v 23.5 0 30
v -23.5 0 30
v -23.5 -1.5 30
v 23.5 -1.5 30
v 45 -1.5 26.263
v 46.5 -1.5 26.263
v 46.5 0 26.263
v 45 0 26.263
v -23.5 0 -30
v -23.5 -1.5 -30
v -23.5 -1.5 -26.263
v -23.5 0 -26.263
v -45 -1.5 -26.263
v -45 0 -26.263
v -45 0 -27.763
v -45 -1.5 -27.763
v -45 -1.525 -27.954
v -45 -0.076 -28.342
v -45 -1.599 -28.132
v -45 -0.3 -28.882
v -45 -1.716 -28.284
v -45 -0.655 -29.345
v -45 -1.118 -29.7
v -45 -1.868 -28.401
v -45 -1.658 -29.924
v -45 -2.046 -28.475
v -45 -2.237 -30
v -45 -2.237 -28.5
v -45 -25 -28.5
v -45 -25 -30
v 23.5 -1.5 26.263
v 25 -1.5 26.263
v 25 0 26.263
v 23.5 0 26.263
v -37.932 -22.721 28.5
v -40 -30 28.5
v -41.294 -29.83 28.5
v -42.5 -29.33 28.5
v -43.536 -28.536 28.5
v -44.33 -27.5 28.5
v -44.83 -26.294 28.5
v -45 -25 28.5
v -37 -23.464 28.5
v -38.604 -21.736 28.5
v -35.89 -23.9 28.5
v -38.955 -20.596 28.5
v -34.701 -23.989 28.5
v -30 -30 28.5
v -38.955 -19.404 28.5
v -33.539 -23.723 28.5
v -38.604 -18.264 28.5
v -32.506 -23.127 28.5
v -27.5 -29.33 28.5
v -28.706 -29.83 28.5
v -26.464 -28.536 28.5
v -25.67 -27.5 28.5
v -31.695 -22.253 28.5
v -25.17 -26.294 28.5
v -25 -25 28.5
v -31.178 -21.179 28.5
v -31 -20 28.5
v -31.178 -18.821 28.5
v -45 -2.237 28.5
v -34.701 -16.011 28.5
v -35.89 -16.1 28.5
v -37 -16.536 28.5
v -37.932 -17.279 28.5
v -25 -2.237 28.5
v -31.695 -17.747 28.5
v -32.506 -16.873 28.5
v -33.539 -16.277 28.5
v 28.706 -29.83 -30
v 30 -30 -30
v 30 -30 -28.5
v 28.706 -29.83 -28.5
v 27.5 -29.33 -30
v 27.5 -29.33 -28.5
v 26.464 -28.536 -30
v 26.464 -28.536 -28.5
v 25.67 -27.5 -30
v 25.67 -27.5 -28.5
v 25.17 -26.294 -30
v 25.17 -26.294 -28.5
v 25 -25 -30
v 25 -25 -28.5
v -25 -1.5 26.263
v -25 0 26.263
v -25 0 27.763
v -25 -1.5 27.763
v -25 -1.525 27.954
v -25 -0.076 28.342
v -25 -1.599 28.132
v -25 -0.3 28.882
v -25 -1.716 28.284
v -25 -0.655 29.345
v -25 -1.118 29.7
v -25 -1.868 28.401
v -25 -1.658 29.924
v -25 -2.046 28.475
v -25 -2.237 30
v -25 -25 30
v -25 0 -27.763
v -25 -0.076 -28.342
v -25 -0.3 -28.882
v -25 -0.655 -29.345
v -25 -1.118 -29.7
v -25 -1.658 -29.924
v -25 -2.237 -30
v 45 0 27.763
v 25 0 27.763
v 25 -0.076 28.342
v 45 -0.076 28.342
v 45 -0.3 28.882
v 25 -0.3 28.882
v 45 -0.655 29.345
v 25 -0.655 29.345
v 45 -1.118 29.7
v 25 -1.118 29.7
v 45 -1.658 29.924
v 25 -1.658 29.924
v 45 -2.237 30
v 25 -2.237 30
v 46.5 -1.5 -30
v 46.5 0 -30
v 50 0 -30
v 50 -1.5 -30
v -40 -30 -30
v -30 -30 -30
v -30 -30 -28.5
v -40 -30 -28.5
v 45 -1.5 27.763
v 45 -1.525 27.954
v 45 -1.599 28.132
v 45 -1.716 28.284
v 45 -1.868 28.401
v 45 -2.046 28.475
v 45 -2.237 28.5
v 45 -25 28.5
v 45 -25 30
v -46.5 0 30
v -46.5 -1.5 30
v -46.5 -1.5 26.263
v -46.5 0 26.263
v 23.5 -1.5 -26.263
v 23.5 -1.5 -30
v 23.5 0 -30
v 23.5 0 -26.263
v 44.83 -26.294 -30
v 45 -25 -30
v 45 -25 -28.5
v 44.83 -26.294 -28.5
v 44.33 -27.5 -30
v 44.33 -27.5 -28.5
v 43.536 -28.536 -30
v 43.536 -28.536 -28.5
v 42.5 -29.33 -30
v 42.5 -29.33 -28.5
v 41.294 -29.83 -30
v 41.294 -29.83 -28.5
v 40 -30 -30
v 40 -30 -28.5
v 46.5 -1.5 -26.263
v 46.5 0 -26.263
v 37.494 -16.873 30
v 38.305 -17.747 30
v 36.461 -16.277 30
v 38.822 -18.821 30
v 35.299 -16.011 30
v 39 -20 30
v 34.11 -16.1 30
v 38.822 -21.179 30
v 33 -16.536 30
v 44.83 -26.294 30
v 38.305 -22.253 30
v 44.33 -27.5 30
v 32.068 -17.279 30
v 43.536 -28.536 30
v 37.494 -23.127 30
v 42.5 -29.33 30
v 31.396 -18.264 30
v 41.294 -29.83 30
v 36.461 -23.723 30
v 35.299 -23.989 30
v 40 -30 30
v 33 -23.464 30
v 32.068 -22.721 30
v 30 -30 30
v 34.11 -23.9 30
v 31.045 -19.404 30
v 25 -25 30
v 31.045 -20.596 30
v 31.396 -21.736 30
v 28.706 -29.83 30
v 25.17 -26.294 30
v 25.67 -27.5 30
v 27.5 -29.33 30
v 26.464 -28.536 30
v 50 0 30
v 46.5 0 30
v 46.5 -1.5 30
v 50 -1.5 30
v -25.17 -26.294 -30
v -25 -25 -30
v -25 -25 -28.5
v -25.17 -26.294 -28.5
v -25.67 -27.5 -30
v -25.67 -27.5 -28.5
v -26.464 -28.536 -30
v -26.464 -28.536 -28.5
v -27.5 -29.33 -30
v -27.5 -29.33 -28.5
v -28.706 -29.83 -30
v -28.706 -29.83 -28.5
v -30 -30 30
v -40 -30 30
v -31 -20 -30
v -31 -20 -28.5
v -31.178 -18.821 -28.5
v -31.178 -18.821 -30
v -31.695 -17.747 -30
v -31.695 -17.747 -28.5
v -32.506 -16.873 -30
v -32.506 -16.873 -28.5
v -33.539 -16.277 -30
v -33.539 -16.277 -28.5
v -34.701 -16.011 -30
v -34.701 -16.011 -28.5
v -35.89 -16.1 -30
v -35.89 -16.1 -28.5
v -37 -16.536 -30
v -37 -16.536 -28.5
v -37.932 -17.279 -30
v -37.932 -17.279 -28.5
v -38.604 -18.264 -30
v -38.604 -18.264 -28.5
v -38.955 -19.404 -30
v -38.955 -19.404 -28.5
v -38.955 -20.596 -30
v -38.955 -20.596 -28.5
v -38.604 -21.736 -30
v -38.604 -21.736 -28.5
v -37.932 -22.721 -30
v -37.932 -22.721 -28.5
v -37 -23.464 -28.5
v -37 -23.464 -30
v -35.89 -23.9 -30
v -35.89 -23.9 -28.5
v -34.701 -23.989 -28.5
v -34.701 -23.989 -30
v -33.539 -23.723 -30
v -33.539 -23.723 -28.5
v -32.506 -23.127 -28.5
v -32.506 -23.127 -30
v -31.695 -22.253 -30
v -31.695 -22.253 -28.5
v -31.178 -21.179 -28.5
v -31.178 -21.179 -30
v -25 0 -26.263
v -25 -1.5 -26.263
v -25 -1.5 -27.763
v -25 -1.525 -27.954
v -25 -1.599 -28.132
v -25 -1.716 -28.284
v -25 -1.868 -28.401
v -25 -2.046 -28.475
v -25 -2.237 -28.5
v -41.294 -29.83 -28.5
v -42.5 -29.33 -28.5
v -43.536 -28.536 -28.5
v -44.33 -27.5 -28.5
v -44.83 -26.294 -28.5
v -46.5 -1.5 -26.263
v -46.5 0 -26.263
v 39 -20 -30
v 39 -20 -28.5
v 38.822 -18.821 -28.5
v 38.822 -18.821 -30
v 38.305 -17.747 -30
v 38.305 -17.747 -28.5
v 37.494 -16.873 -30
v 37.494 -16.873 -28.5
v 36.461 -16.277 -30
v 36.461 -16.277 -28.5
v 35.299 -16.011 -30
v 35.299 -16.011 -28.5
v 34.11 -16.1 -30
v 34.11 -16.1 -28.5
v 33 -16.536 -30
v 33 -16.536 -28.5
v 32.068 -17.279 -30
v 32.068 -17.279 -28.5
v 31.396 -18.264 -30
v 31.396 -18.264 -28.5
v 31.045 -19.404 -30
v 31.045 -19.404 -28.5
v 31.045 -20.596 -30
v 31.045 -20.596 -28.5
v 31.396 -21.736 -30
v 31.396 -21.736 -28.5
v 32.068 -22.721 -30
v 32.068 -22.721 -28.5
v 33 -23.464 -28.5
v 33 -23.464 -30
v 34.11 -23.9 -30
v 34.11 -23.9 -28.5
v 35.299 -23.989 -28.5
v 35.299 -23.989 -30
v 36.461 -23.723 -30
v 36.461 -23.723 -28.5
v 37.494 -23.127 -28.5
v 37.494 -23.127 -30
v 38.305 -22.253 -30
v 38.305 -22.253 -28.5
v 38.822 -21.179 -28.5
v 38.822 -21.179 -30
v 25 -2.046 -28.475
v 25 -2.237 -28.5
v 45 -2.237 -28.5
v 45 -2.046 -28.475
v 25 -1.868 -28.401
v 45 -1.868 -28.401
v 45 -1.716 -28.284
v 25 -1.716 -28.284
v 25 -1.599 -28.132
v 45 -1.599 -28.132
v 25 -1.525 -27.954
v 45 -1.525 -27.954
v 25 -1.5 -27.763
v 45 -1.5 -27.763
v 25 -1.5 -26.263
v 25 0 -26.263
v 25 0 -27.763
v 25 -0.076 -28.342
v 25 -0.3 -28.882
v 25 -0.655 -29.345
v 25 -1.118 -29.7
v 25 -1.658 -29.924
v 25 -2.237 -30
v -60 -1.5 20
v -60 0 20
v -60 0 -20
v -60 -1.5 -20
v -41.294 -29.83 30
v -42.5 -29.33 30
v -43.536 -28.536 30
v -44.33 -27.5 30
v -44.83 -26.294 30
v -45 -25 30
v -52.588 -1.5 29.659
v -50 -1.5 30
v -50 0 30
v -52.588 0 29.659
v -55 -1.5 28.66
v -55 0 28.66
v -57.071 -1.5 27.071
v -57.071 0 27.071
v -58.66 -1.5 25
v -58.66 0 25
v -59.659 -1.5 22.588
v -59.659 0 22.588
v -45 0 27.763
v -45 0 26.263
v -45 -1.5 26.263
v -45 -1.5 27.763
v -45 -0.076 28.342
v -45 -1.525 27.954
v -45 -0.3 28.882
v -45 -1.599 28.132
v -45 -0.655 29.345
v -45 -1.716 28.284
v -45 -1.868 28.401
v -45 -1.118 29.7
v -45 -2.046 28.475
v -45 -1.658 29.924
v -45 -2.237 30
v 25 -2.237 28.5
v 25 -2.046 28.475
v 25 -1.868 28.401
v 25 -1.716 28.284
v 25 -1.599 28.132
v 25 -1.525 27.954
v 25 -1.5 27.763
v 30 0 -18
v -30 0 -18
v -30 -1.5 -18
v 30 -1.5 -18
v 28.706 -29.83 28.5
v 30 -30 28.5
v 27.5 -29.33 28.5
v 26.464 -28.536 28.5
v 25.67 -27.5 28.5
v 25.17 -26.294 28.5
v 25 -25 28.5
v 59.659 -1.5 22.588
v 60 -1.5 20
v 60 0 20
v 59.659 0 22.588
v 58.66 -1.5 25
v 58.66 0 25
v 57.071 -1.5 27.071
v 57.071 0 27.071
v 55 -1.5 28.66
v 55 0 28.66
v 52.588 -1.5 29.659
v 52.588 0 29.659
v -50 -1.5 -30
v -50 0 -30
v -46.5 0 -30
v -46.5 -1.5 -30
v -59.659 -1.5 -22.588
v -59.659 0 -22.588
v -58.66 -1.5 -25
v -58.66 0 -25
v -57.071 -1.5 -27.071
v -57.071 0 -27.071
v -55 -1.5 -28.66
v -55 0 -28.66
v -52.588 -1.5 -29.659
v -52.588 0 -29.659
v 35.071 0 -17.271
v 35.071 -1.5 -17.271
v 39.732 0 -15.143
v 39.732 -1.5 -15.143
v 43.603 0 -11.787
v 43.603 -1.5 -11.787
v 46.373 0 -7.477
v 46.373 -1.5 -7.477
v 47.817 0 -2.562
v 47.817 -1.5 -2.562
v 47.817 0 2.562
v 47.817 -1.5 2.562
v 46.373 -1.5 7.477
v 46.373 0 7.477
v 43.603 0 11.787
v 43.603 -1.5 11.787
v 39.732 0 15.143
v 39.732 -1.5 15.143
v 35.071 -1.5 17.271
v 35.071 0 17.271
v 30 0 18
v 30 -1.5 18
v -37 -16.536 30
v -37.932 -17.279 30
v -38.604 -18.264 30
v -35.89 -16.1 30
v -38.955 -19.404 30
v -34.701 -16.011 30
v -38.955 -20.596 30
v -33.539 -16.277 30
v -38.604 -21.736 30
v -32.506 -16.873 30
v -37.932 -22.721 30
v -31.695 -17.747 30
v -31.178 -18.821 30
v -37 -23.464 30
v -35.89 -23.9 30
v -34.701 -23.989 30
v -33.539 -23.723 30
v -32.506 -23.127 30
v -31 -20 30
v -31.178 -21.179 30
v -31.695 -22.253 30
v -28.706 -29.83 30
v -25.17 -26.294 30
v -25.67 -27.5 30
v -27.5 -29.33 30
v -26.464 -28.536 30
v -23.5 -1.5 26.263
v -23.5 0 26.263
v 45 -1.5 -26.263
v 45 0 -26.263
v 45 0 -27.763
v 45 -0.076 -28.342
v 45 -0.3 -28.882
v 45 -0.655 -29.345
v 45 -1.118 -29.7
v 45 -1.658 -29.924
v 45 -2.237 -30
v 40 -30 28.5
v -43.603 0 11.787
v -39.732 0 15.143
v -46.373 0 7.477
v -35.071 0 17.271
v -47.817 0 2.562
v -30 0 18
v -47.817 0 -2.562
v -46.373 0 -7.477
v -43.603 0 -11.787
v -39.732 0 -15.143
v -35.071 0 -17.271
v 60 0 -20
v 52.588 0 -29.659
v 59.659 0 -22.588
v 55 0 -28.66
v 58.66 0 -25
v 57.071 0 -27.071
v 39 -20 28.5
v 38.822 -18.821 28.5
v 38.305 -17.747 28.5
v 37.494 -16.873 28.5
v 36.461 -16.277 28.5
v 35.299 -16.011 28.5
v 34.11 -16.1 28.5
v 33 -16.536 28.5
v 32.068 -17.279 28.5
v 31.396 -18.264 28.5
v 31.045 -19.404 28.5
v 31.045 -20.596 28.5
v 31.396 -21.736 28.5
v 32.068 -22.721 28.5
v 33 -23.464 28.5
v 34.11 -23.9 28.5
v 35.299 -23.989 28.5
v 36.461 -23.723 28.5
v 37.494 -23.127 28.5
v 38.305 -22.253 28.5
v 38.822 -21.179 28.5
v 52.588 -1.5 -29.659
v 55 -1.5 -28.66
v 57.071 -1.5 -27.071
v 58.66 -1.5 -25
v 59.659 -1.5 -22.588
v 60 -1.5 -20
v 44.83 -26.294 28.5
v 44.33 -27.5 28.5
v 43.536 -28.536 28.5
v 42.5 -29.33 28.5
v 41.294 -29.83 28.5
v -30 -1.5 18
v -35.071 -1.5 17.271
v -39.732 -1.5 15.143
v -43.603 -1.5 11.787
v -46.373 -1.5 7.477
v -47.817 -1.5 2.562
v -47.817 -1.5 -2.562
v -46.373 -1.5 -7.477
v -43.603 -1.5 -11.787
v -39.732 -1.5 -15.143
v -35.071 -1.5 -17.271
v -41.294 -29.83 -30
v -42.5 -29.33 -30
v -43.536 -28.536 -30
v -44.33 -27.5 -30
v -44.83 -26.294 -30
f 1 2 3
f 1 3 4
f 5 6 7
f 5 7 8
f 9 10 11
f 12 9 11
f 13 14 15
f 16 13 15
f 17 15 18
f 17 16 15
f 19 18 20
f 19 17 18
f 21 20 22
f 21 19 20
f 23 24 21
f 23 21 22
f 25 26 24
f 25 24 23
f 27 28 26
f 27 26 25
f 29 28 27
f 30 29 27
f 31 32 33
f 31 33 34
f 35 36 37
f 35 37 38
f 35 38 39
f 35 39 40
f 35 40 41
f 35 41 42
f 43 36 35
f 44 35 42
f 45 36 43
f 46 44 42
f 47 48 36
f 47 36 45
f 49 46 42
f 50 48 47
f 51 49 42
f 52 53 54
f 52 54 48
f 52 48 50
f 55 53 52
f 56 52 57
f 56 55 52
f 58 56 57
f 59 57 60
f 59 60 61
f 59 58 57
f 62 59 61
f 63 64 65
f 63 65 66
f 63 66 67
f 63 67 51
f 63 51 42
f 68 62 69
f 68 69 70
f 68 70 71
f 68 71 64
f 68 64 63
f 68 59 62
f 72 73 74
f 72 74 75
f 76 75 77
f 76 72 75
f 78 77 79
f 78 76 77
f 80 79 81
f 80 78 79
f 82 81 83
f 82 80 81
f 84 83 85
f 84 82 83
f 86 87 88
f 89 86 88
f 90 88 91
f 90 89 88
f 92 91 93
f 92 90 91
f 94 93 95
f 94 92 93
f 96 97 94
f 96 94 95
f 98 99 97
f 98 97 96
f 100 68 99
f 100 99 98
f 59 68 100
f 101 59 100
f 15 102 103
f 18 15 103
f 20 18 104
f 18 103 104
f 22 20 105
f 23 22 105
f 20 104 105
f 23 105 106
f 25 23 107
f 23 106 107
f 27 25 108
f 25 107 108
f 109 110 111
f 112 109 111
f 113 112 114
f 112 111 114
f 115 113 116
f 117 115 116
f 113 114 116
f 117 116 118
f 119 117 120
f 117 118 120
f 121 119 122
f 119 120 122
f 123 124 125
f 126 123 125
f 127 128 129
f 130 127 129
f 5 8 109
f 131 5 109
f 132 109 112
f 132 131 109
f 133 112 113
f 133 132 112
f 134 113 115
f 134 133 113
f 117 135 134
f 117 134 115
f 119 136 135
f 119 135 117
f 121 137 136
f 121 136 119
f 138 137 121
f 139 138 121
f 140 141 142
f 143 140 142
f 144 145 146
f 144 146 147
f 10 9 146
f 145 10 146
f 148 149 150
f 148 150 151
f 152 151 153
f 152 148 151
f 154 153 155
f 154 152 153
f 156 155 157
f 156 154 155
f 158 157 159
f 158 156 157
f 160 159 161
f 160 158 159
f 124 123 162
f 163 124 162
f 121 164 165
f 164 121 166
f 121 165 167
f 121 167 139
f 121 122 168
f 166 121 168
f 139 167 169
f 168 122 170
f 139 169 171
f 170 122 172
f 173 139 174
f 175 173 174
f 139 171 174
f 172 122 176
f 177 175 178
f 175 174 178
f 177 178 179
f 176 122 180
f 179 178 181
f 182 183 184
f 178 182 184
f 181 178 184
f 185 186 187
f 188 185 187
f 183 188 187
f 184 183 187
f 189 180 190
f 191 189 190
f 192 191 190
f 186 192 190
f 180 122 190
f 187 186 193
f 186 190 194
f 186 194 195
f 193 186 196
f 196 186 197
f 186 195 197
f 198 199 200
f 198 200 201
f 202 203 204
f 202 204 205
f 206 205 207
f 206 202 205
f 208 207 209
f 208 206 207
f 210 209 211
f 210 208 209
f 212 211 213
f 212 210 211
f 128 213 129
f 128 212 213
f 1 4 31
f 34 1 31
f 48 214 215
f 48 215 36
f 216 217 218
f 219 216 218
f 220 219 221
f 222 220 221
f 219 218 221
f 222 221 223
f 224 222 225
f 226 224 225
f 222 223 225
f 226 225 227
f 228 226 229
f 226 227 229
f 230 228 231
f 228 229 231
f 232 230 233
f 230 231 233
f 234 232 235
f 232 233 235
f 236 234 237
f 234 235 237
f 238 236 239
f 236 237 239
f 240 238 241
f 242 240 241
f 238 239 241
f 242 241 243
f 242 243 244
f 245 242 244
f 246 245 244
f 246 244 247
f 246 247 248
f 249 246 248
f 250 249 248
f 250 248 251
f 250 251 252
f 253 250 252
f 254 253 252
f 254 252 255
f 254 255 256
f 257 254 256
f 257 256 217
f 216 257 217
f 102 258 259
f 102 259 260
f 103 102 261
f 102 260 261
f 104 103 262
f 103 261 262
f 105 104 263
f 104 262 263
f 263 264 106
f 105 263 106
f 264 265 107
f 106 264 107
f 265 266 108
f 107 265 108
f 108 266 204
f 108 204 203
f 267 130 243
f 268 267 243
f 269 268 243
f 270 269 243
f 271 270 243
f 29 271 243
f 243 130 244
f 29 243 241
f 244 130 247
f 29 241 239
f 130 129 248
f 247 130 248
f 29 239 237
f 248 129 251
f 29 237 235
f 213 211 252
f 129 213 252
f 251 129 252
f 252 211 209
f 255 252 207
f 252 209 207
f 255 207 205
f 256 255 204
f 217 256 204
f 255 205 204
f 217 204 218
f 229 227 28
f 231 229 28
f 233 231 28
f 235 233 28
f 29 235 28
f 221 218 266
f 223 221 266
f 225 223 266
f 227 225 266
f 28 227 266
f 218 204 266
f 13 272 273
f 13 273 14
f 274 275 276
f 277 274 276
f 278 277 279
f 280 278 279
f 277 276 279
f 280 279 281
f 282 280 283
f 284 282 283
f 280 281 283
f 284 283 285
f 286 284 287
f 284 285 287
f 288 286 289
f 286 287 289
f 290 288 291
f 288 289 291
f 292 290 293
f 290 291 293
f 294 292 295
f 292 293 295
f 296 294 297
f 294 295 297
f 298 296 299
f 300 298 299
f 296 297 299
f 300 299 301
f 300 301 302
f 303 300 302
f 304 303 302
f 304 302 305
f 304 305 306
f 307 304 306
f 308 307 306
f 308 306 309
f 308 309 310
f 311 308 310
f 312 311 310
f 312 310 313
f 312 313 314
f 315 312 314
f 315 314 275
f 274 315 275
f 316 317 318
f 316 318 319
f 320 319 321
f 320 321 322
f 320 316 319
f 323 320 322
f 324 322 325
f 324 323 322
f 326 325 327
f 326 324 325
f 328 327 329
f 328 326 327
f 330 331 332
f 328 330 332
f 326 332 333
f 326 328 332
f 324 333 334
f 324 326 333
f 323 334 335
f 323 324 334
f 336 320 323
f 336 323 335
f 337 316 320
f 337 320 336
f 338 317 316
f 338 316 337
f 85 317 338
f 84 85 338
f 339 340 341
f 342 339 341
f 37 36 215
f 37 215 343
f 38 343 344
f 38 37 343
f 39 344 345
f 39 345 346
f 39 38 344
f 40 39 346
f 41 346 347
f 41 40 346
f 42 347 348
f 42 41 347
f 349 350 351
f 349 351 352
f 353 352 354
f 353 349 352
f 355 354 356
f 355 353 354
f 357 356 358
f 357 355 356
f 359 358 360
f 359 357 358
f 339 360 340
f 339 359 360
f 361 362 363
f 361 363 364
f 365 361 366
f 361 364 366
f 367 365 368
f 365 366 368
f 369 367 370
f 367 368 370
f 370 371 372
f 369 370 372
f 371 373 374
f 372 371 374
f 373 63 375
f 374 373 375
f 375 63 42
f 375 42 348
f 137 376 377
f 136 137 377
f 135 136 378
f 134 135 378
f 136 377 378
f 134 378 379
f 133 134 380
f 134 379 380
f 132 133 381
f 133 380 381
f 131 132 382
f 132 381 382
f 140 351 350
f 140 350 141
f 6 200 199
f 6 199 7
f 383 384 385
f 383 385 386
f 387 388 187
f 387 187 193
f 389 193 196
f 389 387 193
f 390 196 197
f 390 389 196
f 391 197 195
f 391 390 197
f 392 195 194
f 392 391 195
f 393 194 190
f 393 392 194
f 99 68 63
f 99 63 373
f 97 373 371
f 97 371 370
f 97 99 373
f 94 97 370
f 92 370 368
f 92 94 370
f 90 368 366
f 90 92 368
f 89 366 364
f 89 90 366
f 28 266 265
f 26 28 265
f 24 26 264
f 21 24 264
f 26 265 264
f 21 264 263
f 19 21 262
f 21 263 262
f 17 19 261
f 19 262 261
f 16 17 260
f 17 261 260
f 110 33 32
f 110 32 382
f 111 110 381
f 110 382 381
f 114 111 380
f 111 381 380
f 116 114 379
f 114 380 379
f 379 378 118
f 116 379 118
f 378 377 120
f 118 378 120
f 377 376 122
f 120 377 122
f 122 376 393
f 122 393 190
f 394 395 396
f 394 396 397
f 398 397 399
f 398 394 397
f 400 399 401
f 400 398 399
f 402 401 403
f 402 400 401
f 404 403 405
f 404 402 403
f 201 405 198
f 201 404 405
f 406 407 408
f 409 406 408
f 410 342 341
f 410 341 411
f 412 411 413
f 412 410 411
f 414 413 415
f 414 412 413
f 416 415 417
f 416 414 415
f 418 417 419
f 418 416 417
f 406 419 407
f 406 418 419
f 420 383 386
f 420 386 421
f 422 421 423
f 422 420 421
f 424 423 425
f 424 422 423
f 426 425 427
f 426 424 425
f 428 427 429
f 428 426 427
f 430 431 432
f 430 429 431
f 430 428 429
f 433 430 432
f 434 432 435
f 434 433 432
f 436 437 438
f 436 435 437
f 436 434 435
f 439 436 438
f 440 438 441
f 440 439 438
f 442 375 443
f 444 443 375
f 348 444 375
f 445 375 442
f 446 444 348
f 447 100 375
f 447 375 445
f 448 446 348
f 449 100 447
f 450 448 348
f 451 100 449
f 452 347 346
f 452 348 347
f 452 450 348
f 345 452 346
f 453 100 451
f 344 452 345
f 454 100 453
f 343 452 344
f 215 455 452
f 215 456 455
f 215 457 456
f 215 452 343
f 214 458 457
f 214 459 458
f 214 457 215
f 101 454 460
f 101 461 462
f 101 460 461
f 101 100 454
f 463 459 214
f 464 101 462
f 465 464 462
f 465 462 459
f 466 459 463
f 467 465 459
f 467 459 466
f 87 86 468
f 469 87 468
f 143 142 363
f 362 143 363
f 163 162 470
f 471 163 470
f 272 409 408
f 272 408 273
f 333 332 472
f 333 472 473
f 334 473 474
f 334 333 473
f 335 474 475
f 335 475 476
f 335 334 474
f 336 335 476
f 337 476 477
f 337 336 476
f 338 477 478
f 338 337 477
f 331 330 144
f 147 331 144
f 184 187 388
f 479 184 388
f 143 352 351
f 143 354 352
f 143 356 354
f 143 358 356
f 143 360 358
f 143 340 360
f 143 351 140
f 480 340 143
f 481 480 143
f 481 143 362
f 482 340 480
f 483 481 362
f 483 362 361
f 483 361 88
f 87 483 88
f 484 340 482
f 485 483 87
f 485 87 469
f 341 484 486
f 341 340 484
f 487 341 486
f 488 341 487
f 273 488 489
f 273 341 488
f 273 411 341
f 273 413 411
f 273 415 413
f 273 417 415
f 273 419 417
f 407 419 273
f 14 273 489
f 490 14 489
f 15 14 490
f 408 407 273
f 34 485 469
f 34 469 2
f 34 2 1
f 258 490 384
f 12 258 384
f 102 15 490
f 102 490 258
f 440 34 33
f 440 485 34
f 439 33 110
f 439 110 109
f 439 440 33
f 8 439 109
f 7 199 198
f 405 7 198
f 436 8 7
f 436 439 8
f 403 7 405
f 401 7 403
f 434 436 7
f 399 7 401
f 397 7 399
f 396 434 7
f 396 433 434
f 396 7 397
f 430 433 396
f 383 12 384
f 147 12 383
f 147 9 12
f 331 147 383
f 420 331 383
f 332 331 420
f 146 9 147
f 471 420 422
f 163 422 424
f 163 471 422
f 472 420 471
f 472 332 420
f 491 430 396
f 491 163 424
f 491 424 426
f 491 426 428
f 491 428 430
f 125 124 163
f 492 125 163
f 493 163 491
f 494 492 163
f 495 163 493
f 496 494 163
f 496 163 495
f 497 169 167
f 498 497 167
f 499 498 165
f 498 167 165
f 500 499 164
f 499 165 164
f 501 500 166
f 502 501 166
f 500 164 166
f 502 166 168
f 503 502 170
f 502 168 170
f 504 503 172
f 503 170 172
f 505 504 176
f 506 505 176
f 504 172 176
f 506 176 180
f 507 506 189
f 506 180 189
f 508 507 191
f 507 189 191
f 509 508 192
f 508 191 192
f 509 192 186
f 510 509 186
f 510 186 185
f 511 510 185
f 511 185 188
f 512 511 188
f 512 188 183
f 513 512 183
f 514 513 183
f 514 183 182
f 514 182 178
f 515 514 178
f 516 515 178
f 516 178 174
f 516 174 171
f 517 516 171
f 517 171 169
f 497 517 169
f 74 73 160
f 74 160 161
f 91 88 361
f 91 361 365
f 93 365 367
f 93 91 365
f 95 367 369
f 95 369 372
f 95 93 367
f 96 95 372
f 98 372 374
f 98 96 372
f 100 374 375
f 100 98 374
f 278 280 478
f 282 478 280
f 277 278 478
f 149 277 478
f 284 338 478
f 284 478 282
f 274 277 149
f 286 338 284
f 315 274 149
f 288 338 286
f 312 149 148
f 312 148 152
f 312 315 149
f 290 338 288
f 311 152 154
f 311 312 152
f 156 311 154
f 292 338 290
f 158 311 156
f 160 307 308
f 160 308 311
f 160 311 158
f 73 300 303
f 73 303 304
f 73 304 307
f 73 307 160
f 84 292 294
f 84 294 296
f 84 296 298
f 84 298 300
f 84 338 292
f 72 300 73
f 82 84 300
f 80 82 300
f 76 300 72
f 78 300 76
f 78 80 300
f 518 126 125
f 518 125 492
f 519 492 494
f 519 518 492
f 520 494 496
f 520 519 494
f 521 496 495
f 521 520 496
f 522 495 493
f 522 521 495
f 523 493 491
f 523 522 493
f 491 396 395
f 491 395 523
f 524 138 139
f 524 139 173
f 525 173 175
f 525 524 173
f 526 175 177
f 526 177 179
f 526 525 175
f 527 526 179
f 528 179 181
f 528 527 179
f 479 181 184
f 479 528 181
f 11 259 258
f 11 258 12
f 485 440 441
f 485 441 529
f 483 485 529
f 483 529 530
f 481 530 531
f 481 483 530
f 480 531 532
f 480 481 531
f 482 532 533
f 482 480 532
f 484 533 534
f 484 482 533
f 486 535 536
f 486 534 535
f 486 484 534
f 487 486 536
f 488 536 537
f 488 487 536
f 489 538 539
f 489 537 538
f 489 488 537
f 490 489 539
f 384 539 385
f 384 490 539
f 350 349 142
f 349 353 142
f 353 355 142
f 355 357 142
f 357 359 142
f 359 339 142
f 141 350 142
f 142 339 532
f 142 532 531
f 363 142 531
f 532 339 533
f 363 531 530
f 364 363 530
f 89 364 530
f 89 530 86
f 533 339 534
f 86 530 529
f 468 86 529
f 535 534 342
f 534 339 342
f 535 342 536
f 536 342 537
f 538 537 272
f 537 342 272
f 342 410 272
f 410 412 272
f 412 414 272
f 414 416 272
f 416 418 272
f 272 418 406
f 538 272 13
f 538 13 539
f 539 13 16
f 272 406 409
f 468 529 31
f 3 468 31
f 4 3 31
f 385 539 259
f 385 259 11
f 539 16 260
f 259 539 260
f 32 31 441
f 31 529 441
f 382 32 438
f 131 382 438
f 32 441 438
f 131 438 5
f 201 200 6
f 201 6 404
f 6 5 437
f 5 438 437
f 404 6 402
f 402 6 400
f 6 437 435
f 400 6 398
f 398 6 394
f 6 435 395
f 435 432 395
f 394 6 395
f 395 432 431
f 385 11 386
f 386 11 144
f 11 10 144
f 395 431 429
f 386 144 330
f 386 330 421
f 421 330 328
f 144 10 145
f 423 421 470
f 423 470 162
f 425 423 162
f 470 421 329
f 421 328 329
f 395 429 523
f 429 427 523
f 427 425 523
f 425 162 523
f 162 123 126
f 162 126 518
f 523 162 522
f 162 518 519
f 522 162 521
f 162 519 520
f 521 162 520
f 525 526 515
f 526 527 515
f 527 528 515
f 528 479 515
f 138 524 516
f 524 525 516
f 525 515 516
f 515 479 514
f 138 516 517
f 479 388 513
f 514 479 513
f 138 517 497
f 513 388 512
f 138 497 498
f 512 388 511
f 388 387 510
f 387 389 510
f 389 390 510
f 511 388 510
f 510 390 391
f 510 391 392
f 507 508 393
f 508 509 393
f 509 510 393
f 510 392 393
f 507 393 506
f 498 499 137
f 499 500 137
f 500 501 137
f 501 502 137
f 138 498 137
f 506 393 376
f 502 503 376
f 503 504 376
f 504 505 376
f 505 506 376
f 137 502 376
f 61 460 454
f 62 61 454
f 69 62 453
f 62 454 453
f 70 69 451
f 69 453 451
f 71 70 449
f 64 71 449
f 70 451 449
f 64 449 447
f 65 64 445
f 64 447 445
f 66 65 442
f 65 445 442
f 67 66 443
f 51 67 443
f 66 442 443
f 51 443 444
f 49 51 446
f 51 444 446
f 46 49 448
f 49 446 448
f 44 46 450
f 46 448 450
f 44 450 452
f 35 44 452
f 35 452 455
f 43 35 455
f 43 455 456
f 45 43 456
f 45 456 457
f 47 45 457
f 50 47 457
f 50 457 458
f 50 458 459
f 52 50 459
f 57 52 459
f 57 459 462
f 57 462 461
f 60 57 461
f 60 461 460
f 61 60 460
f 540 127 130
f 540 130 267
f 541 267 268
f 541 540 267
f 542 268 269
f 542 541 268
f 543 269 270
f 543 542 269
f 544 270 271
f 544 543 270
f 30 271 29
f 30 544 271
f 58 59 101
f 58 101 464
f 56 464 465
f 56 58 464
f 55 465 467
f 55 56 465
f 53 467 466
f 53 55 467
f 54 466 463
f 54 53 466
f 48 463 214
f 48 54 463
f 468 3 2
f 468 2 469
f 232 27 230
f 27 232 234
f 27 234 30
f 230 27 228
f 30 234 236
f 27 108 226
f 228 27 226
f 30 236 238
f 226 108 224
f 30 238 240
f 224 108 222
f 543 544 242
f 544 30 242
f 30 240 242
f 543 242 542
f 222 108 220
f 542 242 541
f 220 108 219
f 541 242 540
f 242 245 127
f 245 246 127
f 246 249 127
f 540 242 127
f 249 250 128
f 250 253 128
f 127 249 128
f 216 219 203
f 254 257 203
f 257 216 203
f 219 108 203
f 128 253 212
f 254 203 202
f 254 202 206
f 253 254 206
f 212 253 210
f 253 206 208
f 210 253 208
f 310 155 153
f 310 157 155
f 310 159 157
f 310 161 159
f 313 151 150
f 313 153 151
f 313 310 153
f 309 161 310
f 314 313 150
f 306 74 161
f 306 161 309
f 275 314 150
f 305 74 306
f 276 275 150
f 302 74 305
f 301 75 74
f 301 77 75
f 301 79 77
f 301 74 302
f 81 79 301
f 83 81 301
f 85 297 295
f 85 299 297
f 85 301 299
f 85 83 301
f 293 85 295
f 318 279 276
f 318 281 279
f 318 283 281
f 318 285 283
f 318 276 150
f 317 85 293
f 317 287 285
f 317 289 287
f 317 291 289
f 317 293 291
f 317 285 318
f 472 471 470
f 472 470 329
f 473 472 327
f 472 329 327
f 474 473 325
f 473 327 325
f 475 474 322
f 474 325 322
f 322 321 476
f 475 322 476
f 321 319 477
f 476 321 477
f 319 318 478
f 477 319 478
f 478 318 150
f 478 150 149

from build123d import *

# Parameters (mm, degrees)
SKETCH1_W                     = 120
SKETCH1_H                     = 60
BASE_FLANGE1_DEPTH            = 1.5
BREAK_CORNER1_START           = -1.5
BREAK_CORNER1_DEPTH           = 1.5
CUT_EXTRUDE1_DEPTH            = 10
EDGE_FLANGE3_STRIP_W          = 7.4732
EDGE_FLANGE3_STRIP_H          = 1.5
EDGE_FLANGE3_STRIP_CUT_DEPTH  = 20
EDGE_FLANGE3_RELIEF_W         = 8.9732
EDGE_FLANGE3_RELIEF_H         = 1.5
EDGE_FLANGE3_RELIEF_CUT_DEPTH = 1.5
EDGE_FLANGE3_DEPTH            = 20
MIRROR2_COPY_1_SKETCH_W       = 7.4732
MIRROR2_COPY_1_SKETCH_H       = 1.5
MIRROR2_COPY_1_DEPTH          = 20
MIRROR2_COPY_2_SKETCH_W       = 8.9732
MIRROR2_COPY_2_SKETCH_H       = 1.5
MIRROR2_COPY_2_DEPTH          = 1.5
MIRROR2_COPY_3_DEPTH          = 20
SKETCH14_R                    = 4
CUT_EXTRUDE2_DEPTH            = 91
BREAK_CORNER2_START           = -30
BREAK_CORNER2_DEPTH           = 60


# Read off the part's stored shape, not the designer's step: Break-Corner1, Break-Corner2
# Sheet-metal steps are written as plain solids
with BuildPart() as part:
    # Sketch1 → Base-Flange1 (new body)
    with BuildSketch(Plane(origin=(0, 0, 0), x_dir=(1, 0, 0), z_dir=(0, 1, 0))):
        Rectangle(SKETCH1_W, SKETCH1_H)
    extrude(amount=-BASE_FLANGE1_DEPTH)

    # Break-Corner1 outline → Break-Corner1 (cut)
    with BuildSketch(Plane(origin=(0, 0, 0), x_dir=(1, 0, 0), z_dir=(0, 1, 0)).offset(BREAK_CORNER1_START)):
        with BuildLine():
            ThreePointArc((50, 30), (57.071067812, 27.071067812), (60, 20))
            Line((60, 20), (60, 30))
            Line((60, 30), (50, 30))
        make_face()
        with BuildLine():
            Line((60, -30), (60, -20))
            ThreePointArc((60, -20), (57.071067812, -27.071067812), (50, -30))
            Line((50, -30), (60, -30))
        make_face()
        with BuildLine():
            ThreePointArc((-60, 20), (-57.071067812, 27.071067812), (-50, 30))
            Line((-50, 30), (-60, 30))
            Line((-60, 30), (-60, 20))
        make_face()
        with BuildLine():
            Line((-60, -30), (-50, -30))
            ThreePointArc((-50, -30), (-57.071067812, -27.071067812), (-60, -20))
            Line((-60, -20), (-60, -30))
        make_face()
    extrude(amount=BREAK_CORNER1_DEPTH, mode=Mode.SUBTRACT)

    # Sketch6 → Cut-Extrude1 (cut)
    with BuildSketch(Plane(origin=(0, 0, 0), x_dir=(1, 0, 0), z_dir=(0, 1, 0))):
        with BuildLine():
            Line((-30, 18), (30, 18))
            ThreePointArc((30, 18), (48, 0), (30, -18))
            Line((30, -18), (-30, -18))
            ThreePointArc((-30, -18), (-48, 0), (-30, 18))
        make_face()
    extrude(amount=-CUT_EXTRUDE1_DEPTH, mode=Mode.SUBTRACT)

    # Edge-Flange3 strip (across the edge) → Edge-Flange3 strip cut (cut)
    with BuildSketch(Plane(origin=(-25, -1.5, 30), x_dir=(0, 0, -1), z_dir=(-1, 0, 0))):
        with Locations((-1.5, -0.75)):
            Rectangle(EDGE_FLANGE3_STRIP_W, EDGE_FLANGE3_STRIP_H)
    edge_flange3_strip_cut = extrude(amount=EDGE_FLANGE3_STRIP_CUT_DEPTH, mode=Mode.SUBTRACT)

    # Edge-Flange3 relief (on the sheet) → Edge-Flange3 relief cut (cut)
    with BuildSketch(Plane(origin=(-25, -1.5, 27.7634), x_dir=(0, 0, -1), z_dir=(0, -1, 0))):
        with Locations((-2.9866, 0.75)):
            Rectangle(EDGE_FLANGE3_RELIEF_W, EDGE_FLANGE3_RELIEF_H)
        with Locations((-2.9866, -20.75)):
            Rectangle(EDGE_FLANGE3_RELIEF_W, EDGE_FLANGE3_RELIEF_H)
    edge_flange3_relief_cut = extrude(amount=-EDGE_FLANGE3_RELIEF_CUT_DEPTH, mode=Mode.SUBTRACT)

    # Edge-Flange3 section (across the edge) → Edge-Flange3 (add)
    with BuildSketch(Plane(origin=(-25, -1.5, 30), x_dir=(0, 0, -1), z_dir=(-1, 0, 0))):
        with BuildLine():
            Line((0, 0.7366), (0, 28.5))
            Line((0, 28.5), (1.5, 28.5))
            Line((1.5, 28.5), (1.5, 0.7366))
            ThreePointArc((1.5, 0.7366), (1.715745145, 0.215745145), (2.2366, 0))
            Line((2.2366, 0), (2.2366, -1.5))
            ThreePointArc((2.2366, -1.5), (0.655084973, -0.844915027), (0, 0.7366))
        make_face()
    edge_flange3 = extrude(amount=EDGE_FLANGE3_DEPTH)

    # Mirror1: Edge-Flange3 strip cut, Edge-Flange3 relief cut, Edge-Flange3 across plane
    add(edge_flange3_strip_cut.mirror(Plane(origin=(0, 0, 0), x_dir=(0, 0, 1), z_dir=(1, 0, 0))), mode=Mode.SUBTRACT)
    add(edge_flange3_relief_cut.mirror(Plane(origin=(0, 0, 0), x_dir=(0, 0, 1), z_dir=(1, 0, 0))), mode=Mode.SUBTRACT)
    add(edge_flange3.mirror(Plane(origin=(0, 0, 0), x_dir=(0, 0, 1), z_dir=(1, 0, 0))))

    # Mirror2: Edge-Flange3 strip cut, Edge-Flange3 relief cut, Edge-Flange3 across plane
    add(edge_flange3_strip_cut.mirror(Plane.XY), mode=Mode.SUBTRACT)
    add(edge_flange3_relief_cut.mirror(Plane.XY), mode=Mode.SUBTRACT)
    add(edge_flange3.mirror(Plane.XY))

    # Mirror2 copy 1 sketch → Mirror2 copy 1 (cut)
    with BuildSketch(Plane(origin=(25, -1.5, -30), x_dir=(0, 0, 1), z_dir=(1, 0, 0))):
        with Locations((-1.5, -0.75)):
            Rectangle(MIRROR2_COPY_1_SKETCH_W, MIRROR2_COPY_1_SKETCH_H)
    extrude(amount=MIRROR2_COPY_1_DEPTH, mode=Mode.SUBTRACT)

    # Mirror2 copy 2 sketch → Mirror2 copy 2 (cut)
    with BuildSketch(Plane(origin=(25, -1.5, -27.7634), x_dir=(0, 0, 1), z_dir=(0, -1, 0))):
        with Locations((-2.9866, 0.75)):
            Rectangle(MIRROR2_COPY_2_SKETCH_W, MIRROR2_COPY_2_SKETCH_H)
        with Locations((-2.9866, -20.75)):
            Rectangle(MIRROR2_COPY_2_SKETCH_W, MIRROR2_COPY_2_SKETCH_H)
    extrude(amount=-MIRROR2_COPY_2_DEPTH, mode=Mode.SUBTRACT)

    # Mirror2 copy 3 sketch → Mirror2 copy 3 (add)
    with BuildSketch(Plane(origin=(25, -1.5, -30), x_dir=(0, 0, 1), z_dir=(1, 0, 0))):
        with BuildLine():
            Line((0, 0.7366), (0, 28.5))
            Line((0, 28.5), (1.5, 28.5))
            Line((1.5, 28.5), (1.5, 0.7366))
            ThreePointArc((1.5, 0.7366), (1.715745145, 0.215745145), (2.2366, 0))
            Line((2.2366, 0), (2.2366, -1.5))
            ThreePointArc((2.2366, -1.5), (0.655084973, -0.844915027), (0, 0.7366))
        make_face()
    extrude(amount=MIRROR2_COPY_3_DEPTH)

    # Sketch14 → Cut-Extrude2 (cut, through all)
    with BuildSketch(Plane.XY.offset(30)):
        with Locations((-35, -20)):
            Circle(SKETCH14_R)
        with Locations((35, -20)):
            Circle(SKETCH14_R)
    extrude(amount=-CUT_EXTRUDE2_DEPTH, mode=Mode.SUBTRACT)

    # Break-Corner2 outline → Break-Corner2 (cut)
    with BuildSketch(Plane.XY.offset(BREAK_CORNER2_START)):
        with BuildLine():
            Line((-25, -30), (-25, -25))
            ThreePointArc((-25, -25), (-26.464466094, -28.535533906), (-30, -30))
            Line((-30, -30), (-25, -30))
        make_face()
        with BuildLine():
            Line((-45, -30), (-40, -30))
            ThreePointArc((-40, -30), (-43.535533906, -28.535533906), (-45, -25))
            Line((-45, -25), (-45, -30))
        make_face()
        with BuildLine():
            Line((45, -30), (45, -25))
            ThreePointArc((45, -25), (43.535533906, -28.535533906), (40, -30))
            Line((40, -30), (45, -30))
        make_face()
        with BuildLine():
            Line((25, -30), (30, -30))
            ThreePointArc((30, -30), (26.464466094, -28.535533906), (25, -25))
            Line((25, -25), (25, -30))
        make_face()
    extrude(amount=BREAK_CORNER2_DEPTH, mode=Mode.SUBTRACT)


solid = part.part
